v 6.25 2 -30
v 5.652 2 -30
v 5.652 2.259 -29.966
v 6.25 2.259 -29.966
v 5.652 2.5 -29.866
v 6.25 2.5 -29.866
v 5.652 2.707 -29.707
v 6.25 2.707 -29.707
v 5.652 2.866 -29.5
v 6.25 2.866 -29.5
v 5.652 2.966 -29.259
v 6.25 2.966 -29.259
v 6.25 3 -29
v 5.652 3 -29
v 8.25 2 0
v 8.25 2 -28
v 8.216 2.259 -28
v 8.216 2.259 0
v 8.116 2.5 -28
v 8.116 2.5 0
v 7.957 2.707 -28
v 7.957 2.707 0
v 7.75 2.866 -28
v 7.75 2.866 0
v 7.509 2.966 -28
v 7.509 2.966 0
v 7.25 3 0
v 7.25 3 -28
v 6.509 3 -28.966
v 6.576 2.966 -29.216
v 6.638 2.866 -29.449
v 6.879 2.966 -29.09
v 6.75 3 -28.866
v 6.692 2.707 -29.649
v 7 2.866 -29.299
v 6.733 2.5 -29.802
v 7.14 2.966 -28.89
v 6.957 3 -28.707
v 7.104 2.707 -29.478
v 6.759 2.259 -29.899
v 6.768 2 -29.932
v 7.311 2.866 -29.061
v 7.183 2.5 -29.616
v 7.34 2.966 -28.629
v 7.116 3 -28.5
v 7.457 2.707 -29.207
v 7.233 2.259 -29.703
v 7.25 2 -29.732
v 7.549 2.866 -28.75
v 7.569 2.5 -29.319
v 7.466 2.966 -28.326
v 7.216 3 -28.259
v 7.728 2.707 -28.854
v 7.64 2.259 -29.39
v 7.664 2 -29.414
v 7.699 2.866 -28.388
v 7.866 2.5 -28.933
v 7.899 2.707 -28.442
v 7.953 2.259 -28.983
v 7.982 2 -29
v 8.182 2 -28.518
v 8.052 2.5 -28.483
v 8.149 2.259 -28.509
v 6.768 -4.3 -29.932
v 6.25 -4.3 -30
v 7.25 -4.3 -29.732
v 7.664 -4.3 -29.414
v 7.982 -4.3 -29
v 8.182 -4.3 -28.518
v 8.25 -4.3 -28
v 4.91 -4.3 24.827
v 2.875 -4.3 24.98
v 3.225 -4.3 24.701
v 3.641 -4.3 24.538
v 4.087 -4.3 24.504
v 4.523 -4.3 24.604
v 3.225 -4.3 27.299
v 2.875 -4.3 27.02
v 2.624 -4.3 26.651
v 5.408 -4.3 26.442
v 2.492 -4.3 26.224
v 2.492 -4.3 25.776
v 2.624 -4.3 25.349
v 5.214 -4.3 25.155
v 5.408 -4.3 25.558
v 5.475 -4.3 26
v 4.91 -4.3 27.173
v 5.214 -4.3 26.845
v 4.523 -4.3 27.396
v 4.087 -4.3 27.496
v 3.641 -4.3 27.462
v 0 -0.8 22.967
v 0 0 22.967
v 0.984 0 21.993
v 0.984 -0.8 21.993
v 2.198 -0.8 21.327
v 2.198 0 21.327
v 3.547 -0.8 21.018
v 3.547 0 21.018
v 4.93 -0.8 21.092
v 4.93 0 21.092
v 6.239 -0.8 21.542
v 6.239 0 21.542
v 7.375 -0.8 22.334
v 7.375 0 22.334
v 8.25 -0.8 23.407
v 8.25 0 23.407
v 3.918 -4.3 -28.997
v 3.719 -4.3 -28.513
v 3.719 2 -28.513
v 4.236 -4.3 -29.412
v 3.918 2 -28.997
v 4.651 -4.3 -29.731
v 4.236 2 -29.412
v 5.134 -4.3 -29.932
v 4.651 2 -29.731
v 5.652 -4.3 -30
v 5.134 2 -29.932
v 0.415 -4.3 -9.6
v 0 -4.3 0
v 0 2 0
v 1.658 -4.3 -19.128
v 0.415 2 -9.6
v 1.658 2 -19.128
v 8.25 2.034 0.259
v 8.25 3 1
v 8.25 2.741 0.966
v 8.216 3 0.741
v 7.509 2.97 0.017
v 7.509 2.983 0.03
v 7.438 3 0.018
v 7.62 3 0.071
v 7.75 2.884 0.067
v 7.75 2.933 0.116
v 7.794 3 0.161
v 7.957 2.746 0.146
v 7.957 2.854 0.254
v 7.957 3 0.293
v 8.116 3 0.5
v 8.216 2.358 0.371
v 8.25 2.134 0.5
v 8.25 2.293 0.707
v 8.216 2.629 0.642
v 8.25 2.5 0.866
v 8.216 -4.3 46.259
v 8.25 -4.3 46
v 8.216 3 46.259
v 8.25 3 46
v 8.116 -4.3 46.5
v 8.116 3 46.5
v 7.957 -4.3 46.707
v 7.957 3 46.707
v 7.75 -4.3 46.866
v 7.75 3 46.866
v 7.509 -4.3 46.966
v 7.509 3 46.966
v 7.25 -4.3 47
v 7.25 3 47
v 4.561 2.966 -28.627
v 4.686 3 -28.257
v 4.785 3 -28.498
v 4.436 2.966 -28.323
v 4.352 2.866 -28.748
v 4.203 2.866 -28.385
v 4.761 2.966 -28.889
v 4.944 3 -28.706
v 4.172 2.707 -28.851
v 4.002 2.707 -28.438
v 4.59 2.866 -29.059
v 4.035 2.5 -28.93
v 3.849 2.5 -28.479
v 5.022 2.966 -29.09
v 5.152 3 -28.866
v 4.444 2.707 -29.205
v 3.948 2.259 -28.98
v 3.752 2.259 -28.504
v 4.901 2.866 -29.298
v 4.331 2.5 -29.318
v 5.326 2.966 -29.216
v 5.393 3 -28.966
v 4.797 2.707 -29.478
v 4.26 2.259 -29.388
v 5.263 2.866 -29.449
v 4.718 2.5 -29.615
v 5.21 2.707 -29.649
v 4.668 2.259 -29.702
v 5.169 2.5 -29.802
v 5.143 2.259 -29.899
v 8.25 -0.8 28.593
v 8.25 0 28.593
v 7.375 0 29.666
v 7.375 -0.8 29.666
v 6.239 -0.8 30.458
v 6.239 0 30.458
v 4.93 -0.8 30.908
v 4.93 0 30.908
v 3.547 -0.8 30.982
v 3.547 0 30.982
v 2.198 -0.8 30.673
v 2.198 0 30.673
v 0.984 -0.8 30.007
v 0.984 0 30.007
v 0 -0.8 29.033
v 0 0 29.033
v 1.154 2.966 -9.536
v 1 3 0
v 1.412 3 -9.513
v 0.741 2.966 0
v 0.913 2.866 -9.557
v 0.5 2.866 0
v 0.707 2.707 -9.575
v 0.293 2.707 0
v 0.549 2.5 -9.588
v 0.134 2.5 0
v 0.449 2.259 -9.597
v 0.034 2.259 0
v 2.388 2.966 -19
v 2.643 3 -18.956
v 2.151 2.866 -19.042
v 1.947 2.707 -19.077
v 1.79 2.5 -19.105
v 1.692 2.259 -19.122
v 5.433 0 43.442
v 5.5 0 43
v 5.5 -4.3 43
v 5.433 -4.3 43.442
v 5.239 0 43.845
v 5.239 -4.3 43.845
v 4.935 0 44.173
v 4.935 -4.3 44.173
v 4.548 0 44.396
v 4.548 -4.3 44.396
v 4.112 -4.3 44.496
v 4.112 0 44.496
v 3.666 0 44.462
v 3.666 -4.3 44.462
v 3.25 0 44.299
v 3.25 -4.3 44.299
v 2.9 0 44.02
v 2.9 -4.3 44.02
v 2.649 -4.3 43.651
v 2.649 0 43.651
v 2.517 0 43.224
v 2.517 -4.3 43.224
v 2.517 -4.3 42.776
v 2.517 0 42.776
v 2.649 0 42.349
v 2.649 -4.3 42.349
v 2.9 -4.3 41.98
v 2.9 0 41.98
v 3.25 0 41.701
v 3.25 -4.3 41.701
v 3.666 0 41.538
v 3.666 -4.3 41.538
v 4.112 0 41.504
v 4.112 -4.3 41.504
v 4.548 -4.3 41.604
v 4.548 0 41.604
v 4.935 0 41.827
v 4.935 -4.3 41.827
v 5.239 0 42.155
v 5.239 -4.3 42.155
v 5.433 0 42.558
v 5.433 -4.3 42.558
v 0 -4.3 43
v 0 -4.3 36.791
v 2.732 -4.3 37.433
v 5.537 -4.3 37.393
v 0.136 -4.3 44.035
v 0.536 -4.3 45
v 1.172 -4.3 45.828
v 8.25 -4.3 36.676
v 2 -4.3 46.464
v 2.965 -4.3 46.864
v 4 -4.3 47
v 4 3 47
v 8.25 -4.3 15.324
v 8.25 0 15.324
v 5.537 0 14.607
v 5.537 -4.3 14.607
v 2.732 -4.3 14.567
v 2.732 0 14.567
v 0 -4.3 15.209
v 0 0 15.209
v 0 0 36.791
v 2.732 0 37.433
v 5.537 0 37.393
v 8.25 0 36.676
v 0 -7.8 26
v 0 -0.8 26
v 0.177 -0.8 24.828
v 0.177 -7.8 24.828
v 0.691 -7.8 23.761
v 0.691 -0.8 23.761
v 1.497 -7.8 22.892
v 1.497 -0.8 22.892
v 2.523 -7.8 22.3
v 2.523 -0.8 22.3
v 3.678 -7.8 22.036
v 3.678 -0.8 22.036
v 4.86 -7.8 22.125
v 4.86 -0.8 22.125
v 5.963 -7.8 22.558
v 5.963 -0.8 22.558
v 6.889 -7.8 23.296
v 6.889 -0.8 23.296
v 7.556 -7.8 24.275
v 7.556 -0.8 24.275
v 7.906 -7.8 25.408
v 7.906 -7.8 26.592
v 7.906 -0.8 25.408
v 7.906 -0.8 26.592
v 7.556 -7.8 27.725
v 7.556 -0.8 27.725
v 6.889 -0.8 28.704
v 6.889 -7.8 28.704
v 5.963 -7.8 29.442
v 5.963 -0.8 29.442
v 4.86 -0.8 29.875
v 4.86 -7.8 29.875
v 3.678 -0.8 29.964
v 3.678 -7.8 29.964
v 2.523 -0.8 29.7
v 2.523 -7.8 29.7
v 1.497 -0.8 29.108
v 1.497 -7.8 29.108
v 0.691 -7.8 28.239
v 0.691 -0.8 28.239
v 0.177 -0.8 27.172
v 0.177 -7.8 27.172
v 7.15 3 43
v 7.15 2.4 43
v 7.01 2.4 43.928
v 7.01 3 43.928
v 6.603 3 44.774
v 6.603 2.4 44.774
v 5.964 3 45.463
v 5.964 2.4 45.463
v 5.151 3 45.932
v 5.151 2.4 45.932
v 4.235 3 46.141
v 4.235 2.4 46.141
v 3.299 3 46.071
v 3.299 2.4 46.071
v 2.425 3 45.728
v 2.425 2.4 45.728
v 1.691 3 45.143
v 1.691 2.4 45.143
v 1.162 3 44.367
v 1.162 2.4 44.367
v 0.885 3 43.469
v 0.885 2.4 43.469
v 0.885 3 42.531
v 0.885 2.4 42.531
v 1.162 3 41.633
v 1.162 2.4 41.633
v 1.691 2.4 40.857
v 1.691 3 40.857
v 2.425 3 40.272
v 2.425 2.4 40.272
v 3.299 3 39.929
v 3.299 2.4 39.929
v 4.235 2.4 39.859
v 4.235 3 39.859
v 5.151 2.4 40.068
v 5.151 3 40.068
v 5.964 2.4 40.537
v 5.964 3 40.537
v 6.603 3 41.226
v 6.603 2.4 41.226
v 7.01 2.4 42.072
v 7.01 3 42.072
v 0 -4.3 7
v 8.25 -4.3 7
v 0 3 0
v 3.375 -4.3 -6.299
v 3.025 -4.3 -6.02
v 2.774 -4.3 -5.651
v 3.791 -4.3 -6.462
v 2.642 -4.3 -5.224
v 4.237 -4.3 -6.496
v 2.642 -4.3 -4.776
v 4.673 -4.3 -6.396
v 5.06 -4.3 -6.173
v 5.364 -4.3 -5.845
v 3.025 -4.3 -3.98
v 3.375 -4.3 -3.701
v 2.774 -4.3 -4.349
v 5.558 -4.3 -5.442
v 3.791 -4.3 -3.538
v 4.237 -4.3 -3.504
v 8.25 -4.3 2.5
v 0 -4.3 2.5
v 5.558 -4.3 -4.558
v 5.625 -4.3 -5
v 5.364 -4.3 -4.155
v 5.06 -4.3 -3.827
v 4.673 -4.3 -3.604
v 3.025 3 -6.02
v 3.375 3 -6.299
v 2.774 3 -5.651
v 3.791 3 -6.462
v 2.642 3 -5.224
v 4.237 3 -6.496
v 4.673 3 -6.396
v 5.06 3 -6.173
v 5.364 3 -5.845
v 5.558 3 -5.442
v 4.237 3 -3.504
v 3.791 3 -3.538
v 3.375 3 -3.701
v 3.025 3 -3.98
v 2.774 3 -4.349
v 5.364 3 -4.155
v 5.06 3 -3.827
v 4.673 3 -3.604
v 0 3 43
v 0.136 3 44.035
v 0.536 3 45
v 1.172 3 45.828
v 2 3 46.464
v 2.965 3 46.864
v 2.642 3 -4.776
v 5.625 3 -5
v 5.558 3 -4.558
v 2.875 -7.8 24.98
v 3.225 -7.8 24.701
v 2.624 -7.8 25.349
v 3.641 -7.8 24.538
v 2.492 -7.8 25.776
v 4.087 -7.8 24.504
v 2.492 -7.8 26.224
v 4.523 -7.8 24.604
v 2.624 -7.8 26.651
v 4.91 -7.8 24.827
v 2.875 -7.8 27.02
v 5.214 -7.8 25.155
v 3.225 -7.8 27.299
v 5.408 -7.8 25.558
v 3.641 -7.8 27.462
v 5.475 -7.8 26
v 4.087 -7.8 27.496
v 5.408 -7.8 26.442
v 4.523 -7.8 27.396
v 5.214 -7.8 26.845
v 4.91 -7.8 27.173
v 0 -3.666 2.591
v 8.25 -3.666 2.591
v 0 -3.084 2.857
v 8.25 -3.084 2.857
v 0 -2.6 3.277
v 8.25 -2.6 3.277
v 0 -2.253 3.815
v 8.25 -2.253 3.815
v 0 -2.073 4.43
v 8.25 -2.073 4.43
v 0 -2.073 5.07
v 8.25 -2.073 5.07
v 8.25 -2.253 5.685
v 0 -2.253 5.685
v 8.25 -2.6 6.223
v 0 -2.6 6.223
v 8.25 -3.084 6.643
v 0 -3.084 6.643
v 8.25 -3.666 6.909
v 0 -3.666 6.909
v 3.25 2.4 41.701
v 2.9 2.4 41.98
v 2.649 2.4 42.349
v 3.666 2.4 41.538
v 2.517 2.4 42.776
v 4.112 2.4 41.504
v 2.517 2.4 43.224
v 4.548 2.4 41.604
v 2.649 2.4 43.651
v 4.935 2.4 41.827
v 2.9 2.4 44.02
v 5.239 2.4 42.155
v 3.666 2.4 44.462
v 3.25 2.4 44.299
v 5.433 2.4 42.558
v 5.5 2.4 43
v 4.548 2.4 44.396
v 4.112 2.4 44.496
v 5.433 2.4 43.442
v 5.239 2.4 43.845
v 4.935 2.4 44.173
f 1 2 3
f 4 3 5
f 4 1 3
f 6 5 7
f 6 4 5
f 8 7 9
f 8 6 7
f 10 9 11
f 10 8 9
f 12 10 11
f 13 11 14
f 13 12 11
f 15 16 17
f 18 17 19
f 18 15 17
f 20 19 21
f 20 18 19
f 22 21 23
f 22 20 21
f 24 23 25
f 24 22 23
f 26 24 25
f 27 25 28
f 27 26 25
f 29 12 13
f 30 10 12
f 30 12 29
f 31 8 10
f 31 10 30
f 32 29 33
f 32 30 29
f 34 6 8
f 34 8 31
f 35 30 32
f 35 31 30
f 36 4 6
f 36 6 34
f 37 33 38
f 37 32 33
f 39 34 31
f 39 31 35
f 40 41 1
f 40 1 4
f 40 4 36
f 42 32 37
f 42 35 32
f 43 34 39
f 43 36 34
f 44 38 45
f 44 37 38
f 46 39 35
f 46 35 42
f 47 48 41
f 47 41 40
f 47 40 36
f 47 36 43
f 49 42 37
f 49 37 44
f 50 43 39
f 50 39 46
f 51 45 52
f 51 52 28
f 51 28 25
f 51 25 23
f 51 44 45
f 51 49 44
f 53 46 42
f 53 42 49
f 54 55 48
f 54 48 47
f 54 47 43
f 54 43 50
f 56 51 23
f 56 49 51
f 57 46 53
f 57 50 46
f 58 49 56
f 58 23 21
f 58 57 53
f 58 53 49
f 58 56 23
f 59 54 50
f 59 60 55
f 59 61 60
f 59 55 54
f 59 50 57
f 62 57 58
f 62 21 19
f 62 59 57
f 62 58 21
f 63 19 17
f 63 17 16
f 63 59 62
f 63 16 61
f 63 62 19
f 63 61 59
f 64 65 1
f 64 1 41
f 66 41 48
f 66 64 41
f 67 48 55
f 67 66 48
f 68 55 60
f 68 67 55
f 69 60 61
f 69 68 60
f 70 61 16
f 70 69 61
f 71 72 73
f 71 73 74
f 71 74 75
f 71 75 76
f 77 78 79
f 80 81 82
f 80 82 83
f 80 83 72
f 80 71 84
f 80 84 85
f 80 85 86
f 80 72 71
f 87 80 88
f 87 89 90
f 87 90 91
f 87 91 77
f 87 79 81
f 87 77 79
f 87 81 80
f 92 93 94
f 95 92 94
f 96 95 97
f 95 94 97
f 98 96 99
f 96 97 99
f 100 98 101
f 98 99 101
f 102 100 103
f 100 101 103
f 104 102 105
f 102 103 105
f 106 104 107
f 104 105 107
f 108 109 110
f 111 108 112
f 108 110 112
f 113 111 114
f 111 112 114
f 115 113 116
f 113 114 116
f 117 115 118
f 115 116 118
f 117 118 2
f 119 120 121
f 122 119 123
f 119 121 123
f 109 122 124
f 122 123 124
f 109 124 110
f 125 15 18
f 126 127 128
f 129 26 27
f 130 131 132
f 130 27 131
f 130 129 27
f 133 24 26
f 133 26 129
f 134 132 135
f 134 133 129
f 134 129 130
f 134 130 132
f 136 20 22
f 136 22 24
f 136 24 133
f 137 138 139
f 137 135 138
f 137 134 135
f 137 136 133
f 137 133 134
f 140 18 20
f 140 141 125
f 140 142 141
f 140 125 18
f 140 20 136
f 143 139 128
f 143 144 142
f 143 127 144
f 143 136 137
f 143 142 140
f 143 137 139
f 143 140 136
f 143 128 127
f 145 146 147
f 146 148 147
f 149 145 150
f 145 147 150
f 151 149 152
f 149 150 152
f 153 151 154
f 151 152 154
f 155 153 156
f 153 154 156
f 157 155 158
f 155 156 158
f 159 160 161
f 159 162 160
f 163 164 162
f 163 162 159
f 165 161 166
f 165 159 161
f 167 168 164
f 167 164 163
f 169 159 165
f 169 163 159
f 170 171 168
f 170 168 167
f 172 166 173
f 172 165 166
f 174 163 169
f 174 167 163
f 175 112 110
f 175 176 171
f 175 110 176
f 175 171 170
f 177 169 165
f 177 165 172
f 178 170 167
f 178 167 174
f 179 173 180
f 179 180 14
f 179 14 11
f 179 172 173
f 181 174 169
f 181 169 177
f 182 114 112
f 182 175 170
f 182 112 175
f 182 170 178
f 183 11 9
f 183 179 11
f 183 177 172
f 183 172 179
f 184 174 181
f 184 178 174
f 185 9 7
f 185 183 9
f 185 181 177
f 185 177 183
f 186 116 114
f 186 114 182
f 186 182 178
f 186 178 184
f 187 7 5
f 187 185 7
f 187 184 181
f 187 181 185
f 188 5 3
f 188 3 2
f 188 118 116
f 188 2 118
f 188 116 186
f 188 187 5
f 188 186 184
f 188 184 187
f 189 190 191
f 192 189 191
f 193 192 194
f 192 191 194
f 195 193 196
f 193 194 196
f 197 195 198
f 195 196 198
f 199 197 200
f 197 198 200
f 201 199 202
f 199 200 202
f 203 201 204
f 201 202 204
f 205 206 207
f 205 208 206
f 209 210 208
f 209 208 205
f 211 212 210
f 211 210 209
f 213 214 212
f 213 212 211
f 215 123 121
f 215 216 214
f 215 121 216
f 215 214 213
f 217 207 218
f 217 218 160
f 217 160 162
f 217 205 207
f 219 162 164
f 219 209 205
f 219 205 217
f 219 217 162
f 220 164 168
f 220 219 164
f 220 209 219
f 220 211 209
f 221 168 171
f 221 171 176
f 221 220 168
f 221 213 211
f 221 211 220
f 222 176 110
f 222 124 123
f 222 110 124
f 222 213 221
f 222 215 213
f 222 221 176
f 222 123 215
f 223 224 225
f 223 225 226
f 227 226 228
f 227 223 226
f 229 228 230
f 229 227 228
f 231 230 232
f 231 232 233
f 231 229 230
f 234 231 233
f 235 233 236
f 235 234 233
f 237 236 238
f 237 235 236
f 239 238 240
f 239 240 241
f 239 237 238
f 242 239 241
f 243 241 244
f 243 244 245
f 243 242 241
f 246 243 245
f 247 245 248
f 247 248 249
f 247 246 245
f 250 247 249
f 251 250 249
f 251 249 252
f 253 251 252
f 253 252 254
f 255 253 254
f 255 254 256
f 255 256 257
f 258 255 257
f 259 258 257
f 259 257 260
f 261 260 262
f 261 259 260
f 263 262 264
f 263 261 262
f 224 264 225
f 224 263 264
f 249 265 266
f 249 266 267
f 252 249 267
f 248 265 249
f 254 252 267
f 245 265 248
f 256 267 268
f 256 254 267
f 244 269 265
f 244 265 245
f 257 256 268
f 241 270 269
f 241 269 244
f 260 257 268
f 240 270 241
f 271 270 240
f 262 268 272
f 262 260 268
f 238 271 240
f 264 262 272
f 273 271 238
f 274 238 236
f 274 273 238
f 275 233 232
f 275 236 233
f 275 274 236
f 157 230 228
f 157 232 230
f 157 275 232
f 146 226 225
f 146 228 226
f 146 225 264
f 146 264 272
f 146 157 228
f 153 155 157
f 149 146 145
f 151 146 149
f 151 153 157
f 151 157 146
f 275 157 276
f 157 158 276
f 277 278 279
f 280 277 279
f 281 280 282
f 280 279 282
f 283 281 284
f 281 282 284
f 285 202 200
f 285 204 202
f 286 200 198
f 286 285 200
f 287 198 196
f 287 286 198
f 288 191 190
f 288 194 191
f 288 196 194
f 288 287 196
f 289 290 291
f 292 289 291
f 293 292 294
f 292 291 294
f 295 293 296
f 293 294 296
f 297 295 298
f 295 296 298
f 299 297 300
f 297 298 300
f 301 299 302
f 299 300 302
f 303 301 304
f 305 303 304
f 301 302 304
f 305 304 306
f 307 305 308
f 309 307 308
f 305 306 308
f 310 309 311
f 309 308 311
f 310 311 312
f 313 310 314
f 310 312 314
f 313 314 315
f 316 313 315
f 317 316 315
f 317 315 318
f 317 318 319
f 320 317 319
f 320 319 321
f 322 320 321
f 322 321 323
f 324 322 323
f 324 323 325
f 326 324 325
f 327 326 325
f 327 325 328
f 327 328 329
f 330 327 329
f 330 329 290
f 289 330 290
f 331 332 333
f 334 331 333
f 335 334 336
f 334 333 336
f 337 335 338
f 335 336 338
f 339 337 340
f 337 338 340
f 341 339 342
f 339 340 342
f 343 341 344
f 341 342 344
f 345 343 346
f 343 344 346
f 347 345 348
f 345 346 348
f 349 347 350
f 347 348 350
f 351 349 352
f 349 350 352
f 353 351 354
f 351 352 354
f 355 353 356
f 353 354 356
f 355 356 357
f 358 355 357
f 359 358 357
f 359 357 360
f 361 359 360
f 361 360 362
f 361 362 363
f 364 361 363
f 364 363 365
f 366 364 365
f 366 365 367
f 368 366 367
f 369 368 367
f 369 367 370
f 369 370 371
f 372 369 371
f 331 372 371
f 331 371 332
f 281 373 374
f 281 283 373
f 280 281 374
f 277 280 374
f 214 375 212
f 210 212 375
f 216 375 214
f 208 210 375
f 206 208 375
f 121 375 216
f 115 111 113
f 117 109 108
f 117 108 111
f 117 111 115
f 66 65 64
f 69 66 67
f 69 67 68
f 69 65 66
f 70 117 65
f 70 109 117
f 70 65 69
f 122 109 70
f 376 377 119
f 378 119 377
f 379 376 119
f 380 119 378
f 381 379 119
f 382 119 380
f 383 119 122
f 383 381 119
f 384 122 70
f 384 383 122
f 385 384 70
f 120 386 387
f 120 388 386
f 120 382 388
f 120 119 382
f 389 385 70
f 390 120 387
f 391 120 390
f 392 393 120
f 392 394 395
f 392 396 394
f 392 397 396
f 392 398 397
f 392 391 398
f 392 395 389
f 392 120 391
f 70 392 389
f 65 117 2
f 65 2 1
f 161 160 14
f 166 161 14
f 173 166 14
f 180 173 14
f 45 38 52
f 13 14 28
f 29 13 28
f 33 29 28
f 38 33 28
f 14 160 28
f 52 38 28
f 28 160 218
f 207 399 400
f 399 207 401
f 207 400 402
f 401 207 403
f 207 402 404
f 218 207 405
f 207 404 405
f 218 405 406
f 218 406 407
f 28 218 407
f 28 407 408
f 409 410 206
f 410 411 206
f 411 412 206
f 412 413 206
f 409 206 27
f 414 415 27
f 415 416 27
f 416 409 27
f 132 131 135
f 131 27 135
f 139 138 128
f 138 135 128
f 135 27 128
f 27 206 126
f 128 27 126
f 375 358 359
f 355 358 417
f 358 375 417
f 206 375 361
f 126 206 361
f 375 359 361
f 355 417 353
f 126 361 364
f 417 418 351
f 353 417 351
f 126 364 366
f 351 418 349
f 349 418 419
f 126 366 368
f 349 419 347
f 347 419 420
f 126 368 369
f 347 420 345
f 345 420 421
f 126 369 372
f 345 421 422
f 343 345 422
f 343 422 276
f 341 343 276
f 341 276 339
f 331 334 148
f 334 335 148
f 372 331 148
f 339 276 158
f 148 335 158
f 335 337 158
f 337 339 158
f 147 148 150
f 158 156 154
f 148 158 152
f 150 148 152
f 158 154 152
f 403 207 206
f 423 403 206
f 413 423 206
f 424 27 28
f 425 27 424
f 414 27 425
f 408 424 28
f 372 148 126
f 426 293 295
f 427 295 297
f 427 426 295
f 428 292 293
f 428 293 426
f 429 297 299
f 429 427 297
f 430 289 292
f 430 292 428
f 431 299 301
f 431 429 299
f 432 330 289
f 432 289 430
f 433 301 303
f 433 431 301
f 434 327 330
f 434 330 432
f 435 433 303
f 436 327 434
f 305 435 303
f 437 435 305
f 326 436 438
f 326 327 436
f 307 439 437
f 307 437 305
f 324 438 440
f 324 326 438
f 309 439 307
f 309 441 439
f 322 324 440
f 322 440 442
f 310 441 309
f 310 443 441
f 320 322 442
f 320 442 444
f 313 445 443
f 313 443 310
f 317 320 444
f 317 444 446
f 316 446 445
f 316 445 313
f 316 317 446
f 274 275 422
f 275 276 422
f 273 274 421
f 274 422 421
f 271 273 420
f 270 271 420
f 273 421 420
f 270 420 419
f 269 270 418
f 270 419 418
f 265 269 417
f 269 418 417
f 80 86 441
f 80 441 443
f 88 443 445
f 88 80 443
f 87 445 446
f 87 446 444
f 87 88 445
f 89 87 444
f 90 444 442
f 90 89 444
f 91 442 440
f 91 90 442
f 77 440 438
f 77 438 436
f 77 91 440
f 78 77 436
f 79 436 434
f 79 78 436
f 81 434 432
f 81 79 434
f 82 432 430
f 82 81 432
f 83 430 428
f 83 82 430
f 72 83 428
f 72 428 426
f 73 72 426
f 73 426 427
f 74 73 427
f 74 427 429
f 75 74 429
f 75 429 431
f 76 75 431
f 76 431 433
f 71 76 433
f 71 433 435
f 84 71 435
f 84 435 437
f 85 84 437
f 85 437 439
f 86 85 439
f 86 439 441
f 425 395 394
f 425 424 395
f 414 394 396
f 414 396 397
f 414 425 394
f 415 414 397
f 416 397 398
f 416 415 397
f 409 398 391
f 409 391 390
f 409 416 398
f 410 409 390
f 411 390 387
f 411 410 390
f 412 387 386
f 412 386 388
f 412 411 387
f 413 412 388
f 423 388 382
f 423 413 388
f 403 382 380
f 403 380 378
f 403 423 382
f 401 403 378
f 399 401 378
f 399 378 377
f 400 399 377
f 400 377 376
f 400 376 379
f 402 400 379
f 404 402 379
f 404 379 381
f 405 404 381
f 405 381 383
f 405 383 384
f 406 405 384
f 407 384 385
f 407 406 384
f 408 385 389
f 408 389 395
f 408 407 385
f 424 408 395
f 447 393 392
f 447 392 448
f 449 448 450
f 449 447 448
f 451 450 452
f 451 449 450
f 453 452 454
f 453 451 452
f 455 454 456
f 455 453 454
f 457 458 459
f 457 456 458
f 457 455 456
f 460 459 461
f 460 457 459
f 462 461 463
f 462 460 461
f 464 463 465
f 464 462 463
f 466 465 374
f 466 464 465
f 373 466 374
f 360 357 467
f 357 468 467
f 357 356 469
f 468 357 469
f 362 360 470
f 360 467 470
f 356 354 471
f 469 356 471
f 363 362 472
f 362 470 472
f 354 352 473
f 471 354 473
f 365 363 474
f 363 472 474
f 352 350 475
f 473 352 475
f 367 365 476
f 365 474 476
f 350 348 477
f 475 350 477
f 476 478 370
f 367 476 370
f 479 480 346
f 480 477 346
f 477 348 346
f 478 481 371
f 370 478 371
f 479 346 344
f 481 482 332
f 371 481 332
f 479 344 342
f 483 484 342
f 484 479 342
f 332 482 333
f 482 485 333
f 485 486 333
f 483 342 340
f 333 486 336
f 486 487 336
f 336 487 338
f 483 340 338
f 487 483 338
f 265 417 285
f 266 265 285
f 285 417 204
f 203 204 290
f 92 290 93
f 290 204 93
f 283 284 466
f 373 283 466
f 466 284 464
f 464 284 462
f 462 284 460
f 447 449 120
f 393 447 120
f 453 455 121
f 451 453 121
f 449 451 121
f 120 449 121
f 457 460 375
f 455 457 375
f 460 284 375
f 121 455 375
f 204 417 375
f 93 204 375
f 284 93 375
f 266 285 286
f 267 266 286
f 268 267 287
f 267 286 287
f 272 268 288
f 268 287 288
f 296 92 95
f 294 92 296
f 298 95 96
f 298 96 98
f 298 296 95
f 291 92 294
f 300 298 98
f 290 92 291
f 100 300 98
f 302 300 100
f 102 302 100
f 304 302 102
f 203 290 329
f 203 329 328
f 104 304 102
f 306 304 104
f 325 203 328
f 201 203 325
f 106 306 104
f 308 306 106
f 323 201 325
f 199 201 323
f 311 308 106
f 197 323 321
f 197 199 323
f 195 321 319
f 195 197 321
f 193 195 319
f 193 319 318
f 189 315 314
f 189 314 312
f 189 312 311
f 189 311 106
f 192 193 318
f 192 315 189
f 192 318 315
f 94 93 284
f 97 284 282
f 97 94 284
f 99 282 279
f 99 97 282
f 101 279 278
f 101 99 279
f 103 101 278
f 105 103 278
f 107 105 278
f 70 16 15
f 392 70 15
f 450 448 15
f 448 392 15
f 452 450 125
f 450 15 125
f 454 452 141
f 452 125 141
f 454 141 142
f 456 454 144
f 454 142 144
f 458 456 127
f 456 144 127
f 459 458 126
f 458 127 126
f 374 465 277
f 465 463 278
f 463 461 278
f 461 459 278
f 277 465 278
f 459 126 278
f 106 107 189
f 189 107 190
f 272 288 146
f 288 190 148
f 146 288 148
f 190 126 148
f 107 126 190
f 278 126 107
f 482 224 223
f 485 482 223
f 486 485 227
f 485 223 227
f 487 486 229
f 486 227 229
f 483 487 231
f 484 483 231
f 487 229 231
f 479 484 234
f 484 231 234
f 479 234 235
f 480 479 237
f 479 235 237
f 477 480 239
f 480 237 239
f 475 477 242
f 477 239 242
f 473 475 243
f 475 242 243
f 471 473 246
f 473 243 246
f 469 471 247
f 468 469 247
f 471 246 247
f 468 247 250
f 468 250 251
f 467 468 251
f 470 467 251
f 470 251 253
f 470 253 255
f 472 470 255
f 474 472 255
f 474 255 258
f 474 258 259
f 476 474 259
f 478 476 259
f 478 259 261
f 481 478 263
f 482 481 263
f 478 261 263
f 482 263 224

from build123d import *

# Parameters (mm, degrees)
F0_R      = 1.5
F3_DEPTH  = 3
F0_R_2    = 3.15
F5_DEPTH  = 3
F6_DEPTH  = 4.3
F7_DEPTH  = 7.8
F8_DEPTH  = 0.8
F1_R      = 2.25
F9_DEPTH  = 88
F10_DEPTH = 0.8
F12_R     = 1
F13_DEPTH = 2.4


# Not quite as in the source:
# - an extrude ends at something that could not be found from the text; its depth is read off the source's solid


with BuildPart() as f3:
    # F0 (on Front) → F3 (new body)
    with BuildSketch(Plane.XZ):
        with BuildLine():
            Line((8.25, -28), (8.25, 0))
            Line((8.25, 0), (0, 0))
            ThreePointArc((0, 0), (0.9337479911, -14.3772966716), (3.7193040011, -28.5130394045))
            ThreePointArc((3.7193040011, -28.5130394045), (4.4329720676, -29.5852568891), (5.6523820051, -30))
            Line((5.6523820051, -30), (6.25, -30))
            ThreePointArc((6.25, -30), (7.6642135624, -29.4142135624), (8.25, -28))
        make_face()
        with Locations((4.125, -5)):
            Circle(F0_R, mode=Mode.SUBTRACT)
    extrude(amount=-F3_DEPTH)

    # F4: sweep along a path in F4_path
    with BuildLine(Plane(origin=(3.7193040011, 3, -28.5130394045), x_dir=(0, 0, 1), z_dir=(0, -1, 0))) as f4_path:
        ThreePointArc((28.5130394045, 3.7193040011), (14.1357427329, 2.78555601), (0, 0))
        ThreePointArc((0, 0), (-1.0722174846, -0.7136680665), (-1.4869605955, -1.933078004))
        Line((-1.4869605955, -1.933078004), (-1.4869605955, -2.5306959989))
        ThreePointArc((-1.4869605955, -2.5306959989), (-0.9011741579, -3.9449095613), (0.5130394045, -4.5306959989))
        Line((0.5130394045, -4.5306959989), (28.5130394045, -4.5306959989))
    # F2 (on Top) → F4 (sweep, cut)
    with BuildSketch(Plane.XY):
        with BuildLine():
            ThreePointArc((7.25, 3), (7.9571067812, 2.7071067812), (8.25, 2))
            Line((8.25, 2), (8.25, 3))
            Line((8.25, 3), (7.25, 3))
        make_face()
    sweep(path=f4_path.line, mode=Mode.SUBTRACT)

    # F0 (on Front) → F5 (join, through all)
    with BuildSketch(Plane.XZ):
        with BuildLine():
            Line((8.25, 0), (8.25, 15.324121816))
            ThreePointArc((8.25, 15.324121816), (4.1356957298, 14.5011227991), (0, 15.2088288402))
            Line((0, 15.2088288402), (0, 0))
            Line((0, 0), (8.25, 0))
        make_face()
        with BuildLine():
            Line((8.25, 15.324121816), (8.25, 23.4068600115))
            ThreePointArc((8.25, 23.4068600115), (4.2412321866, 21.0070929888), (0, 22.9669528523))
            Line((0, 22.9669528523), (0, 15.2088288402))
            ThreePointArc((0, 15.2088288402), (4.1356957298, 14.5011227991), (8.25, 15.324121816))
        make_face()
        with BuildLine():
            Line((8.25, 23.4068600115), (8.25, 26))
            Line((8.25, 26), (7.95, 26))
            ThreePointArc((7.95, 26), (3.975, 22.025), (0, 26))
            Line((0, 26), (0, 22.9669528523))
            ThreePointArc((0, 22.9669528523), (4.2412321866, 21.0070929888), (8.25, 23.4068600115))
        make_face()
        with BuildLine():
            ThreePointArc((7.95, 26), (3.975, 29.975), (0, 26))
            ThreePointArc((0, 26), (3.975, 22.025), (7.95, 26))
        make_face()
        with Locations((3.975, 26)):
            Circle(F0_R, mode=Mode.SUBTRACT)
        with Locations((3.975, 26)):
            Circle(F0_R)
        with BuildLine():
            Line((8.25, 26), (8.25, 28.5931399885))
            ThreePointArc((8.25, 28.5931399885), (4.2412321866, 30.9929070112), (0, 29.0330471477))
            Line((0, 29.0330471477), (0, 26))
            ThreePointArc((0, 26), (3.975, 29.975), (7.95, 26))
            Line((7.95, 26), (8.25, 26))
        make_face()
        with BuildLine():
            Line((8.25, 28.5931399885), (8.25, 36.675878184))
            ThreePointArc((8.25, 36.675878184), (4.1356957298, 37.4988772009), (0, 36.7911711598))
            Line((0, 36.7911711598), (0, 29.0330471477))
            ThreePointArc((0, 29.0330471477), (4.2412321866, 30.9929070112), (8.25, 28.5931399885))
        make_face()
        with BuildLine():
            Line((8.25, 47), (4, 47))
            ThreePointArc((4, 47), (1.1715728753, 45.8284271247), (0, 43))
            Line((0, 43), (0, 36.7911711598))
            ThreePointArc((0, 36.7911711598), (4.1356957298, 37.4988772009), (8.25, 36.675878184))
            Line((8.25, 36.675878184), (8.25, 47))
        make_face()
        with Locations((4, 43)):
            Circle(F0_R_2, mode=Mode.SUBTRACT)
    extrude(amount=-F5_DEPTH)

    # F0 (on Front) → F6 (join)
    with BuildSketch(Plane.XZ):
        with BuildLine():
            Line((8.25, 47), (4, 47))
            ThreePointArc((4, 47), (1.1715728753, 45.8284271247), (0, 43))
            Line((0, 43), (0, 36.7911711598))
            ThreePointArc((0, 36.7911711598), (4.1356957298, 37.4988772009), (8.25, 36.675878184))
            Line((8.25, 36.675878184), (8.25, 47))
        make_face()
        with Locations((4, 43)):
            Circle(F0_R_2, mode=Mode.SUBTRACT)
        with BuildLine():
            Line((8.25, -28), (8.25, 0))
            Line((8.25, 0), (0, 0))
            ThreePointArc((0, 0), (0.9337479911, -14.3772966716), (3.7193040011, -28.5130394045))
            ThreePointArc((3.7193040011, -28.5130394045), (4.4329720676, -29.5852568891), (5.6523820051, -30))
            Line((5.6523820051, -30), (6.25, -30))
            ThreePointArc((6.25, -30), (7.6642135624, -29.4142135624), (8.25, -28))
        make_face()
        with Locations((4.125, -5)):
            Circle(F0_R, mode=Mode.SUBTRACT)
        with Locations((3.975, 26)):
            Circle(F0_R)
        with BuildLine():
            Line((8.25, 0), (8.25, 15.324121816))
            ThreePointArc((8.25, 15.324121816), (4.1356957298, 14.5011227991), (0, 15.2088288402))
            Line((0, 15.2088288402), (0, 0))
            Line((0, 0), (8.25, 0))
        make_face()
        with Locations((4, 43)):
            Circle(F0_R_2)
        with Locations((4, 43)):
            Circle(F0_R, mode=Mode.SUBTRACT)
    extrude(amount=F6_DEPTH)

    # F0 (on Front) → F7 (join)
    with BuildSketch(Plane.XZ):
        with BuildLine():
            ThreePointArc((7.95, 26), (3.975, 29.975), (0, 26))
            ThreePointArc((0, 26), (3.975, 22.025), (7.95, 26))
        make_face()
        with Locations((3.975, 26)):
            Circle(F0_R, mode=Mode.SUBTRACT)
    extrude(amount=F7_DEPTH)

    # F0 (on Front) → F8 (join)
    with BuildSketch(Plane.XZ):
        with BuildLine():
            Line((8.25, 26), (8.25, 28.5931399885))
            ThreePointArc((8.25, 28.5931399885), (4.2412321866, 30.9929070112), (0, 29.0330471477))
            Line((0, 29.0330471477), (0, 26))
            ThreePointArc((0, 26), (3.975, 29.975), (7.95, 26))
            Line((7.95, 26), (8.25, 26))
        make_face()
    extrude(amount=F8_DEPTH)

    # F1 (on Right) → F9 (cut, through all)
    with BuildSketch(Plane.YZ):
        with Locations((-4.3, 4.75)):
            Circle(F1_R)
    extrude(amount=F9_DEPTH, mode=Mode.SUBTRACT)

    # F0 (on Front) → F10 (join)
    with BuildSketch(Plane.XZ):
        with BuildLine():
            Line((8.25, 23.4068600115), (8.25, 26))
            Line((8.25, 26), (7.95, 26))
            ThreePointArc((7.95, 26), (3.975, 22.025), (0, 26))
            Line((0, 26), (0, 22.9669528523))
            ThreePointArc((0, 22.9669528523), (4.2412321866, 21.0070929888), (8.25, 23.4068600115))
        make_face()
    extrude(amount=F10_DEPTH)

    # F2 (on Top) → F11 (revolve, cut)
    with BuildSketch(Plane.XY):
        with BuildLine():
            ThreePointArc((7.25, 3), (7.9571067812, 2.7071067812), (8.25, 2))
            Line((8.25, 2), (8.25, 3))
            Line((8.25, 3), (7.25, 3))
        make_face()
    revolve(axis=Axis((7.75, 3, 0), (-1, 0, 0)), mode=Mode.SUBTRACT)

    # F12
    f12_edges = [f3.edges().sort_by_distance(p)[0] for p in [
        (8.25, -0.65, 47),
    ]]
    fillet(f12_edges, radius=F12_R)

    # F0 (on Front) → F13 (join)
    with BuildSketch(Plane.XZ):
        with Locations((4, 43)):
            Circle(F0_R_2)
        with Locations((4, 43)):
            Circle(F0_R, mode=Mode.SUBTRACT)
    extrude(amount=-F13_DEPTH)


solid = f3.part
